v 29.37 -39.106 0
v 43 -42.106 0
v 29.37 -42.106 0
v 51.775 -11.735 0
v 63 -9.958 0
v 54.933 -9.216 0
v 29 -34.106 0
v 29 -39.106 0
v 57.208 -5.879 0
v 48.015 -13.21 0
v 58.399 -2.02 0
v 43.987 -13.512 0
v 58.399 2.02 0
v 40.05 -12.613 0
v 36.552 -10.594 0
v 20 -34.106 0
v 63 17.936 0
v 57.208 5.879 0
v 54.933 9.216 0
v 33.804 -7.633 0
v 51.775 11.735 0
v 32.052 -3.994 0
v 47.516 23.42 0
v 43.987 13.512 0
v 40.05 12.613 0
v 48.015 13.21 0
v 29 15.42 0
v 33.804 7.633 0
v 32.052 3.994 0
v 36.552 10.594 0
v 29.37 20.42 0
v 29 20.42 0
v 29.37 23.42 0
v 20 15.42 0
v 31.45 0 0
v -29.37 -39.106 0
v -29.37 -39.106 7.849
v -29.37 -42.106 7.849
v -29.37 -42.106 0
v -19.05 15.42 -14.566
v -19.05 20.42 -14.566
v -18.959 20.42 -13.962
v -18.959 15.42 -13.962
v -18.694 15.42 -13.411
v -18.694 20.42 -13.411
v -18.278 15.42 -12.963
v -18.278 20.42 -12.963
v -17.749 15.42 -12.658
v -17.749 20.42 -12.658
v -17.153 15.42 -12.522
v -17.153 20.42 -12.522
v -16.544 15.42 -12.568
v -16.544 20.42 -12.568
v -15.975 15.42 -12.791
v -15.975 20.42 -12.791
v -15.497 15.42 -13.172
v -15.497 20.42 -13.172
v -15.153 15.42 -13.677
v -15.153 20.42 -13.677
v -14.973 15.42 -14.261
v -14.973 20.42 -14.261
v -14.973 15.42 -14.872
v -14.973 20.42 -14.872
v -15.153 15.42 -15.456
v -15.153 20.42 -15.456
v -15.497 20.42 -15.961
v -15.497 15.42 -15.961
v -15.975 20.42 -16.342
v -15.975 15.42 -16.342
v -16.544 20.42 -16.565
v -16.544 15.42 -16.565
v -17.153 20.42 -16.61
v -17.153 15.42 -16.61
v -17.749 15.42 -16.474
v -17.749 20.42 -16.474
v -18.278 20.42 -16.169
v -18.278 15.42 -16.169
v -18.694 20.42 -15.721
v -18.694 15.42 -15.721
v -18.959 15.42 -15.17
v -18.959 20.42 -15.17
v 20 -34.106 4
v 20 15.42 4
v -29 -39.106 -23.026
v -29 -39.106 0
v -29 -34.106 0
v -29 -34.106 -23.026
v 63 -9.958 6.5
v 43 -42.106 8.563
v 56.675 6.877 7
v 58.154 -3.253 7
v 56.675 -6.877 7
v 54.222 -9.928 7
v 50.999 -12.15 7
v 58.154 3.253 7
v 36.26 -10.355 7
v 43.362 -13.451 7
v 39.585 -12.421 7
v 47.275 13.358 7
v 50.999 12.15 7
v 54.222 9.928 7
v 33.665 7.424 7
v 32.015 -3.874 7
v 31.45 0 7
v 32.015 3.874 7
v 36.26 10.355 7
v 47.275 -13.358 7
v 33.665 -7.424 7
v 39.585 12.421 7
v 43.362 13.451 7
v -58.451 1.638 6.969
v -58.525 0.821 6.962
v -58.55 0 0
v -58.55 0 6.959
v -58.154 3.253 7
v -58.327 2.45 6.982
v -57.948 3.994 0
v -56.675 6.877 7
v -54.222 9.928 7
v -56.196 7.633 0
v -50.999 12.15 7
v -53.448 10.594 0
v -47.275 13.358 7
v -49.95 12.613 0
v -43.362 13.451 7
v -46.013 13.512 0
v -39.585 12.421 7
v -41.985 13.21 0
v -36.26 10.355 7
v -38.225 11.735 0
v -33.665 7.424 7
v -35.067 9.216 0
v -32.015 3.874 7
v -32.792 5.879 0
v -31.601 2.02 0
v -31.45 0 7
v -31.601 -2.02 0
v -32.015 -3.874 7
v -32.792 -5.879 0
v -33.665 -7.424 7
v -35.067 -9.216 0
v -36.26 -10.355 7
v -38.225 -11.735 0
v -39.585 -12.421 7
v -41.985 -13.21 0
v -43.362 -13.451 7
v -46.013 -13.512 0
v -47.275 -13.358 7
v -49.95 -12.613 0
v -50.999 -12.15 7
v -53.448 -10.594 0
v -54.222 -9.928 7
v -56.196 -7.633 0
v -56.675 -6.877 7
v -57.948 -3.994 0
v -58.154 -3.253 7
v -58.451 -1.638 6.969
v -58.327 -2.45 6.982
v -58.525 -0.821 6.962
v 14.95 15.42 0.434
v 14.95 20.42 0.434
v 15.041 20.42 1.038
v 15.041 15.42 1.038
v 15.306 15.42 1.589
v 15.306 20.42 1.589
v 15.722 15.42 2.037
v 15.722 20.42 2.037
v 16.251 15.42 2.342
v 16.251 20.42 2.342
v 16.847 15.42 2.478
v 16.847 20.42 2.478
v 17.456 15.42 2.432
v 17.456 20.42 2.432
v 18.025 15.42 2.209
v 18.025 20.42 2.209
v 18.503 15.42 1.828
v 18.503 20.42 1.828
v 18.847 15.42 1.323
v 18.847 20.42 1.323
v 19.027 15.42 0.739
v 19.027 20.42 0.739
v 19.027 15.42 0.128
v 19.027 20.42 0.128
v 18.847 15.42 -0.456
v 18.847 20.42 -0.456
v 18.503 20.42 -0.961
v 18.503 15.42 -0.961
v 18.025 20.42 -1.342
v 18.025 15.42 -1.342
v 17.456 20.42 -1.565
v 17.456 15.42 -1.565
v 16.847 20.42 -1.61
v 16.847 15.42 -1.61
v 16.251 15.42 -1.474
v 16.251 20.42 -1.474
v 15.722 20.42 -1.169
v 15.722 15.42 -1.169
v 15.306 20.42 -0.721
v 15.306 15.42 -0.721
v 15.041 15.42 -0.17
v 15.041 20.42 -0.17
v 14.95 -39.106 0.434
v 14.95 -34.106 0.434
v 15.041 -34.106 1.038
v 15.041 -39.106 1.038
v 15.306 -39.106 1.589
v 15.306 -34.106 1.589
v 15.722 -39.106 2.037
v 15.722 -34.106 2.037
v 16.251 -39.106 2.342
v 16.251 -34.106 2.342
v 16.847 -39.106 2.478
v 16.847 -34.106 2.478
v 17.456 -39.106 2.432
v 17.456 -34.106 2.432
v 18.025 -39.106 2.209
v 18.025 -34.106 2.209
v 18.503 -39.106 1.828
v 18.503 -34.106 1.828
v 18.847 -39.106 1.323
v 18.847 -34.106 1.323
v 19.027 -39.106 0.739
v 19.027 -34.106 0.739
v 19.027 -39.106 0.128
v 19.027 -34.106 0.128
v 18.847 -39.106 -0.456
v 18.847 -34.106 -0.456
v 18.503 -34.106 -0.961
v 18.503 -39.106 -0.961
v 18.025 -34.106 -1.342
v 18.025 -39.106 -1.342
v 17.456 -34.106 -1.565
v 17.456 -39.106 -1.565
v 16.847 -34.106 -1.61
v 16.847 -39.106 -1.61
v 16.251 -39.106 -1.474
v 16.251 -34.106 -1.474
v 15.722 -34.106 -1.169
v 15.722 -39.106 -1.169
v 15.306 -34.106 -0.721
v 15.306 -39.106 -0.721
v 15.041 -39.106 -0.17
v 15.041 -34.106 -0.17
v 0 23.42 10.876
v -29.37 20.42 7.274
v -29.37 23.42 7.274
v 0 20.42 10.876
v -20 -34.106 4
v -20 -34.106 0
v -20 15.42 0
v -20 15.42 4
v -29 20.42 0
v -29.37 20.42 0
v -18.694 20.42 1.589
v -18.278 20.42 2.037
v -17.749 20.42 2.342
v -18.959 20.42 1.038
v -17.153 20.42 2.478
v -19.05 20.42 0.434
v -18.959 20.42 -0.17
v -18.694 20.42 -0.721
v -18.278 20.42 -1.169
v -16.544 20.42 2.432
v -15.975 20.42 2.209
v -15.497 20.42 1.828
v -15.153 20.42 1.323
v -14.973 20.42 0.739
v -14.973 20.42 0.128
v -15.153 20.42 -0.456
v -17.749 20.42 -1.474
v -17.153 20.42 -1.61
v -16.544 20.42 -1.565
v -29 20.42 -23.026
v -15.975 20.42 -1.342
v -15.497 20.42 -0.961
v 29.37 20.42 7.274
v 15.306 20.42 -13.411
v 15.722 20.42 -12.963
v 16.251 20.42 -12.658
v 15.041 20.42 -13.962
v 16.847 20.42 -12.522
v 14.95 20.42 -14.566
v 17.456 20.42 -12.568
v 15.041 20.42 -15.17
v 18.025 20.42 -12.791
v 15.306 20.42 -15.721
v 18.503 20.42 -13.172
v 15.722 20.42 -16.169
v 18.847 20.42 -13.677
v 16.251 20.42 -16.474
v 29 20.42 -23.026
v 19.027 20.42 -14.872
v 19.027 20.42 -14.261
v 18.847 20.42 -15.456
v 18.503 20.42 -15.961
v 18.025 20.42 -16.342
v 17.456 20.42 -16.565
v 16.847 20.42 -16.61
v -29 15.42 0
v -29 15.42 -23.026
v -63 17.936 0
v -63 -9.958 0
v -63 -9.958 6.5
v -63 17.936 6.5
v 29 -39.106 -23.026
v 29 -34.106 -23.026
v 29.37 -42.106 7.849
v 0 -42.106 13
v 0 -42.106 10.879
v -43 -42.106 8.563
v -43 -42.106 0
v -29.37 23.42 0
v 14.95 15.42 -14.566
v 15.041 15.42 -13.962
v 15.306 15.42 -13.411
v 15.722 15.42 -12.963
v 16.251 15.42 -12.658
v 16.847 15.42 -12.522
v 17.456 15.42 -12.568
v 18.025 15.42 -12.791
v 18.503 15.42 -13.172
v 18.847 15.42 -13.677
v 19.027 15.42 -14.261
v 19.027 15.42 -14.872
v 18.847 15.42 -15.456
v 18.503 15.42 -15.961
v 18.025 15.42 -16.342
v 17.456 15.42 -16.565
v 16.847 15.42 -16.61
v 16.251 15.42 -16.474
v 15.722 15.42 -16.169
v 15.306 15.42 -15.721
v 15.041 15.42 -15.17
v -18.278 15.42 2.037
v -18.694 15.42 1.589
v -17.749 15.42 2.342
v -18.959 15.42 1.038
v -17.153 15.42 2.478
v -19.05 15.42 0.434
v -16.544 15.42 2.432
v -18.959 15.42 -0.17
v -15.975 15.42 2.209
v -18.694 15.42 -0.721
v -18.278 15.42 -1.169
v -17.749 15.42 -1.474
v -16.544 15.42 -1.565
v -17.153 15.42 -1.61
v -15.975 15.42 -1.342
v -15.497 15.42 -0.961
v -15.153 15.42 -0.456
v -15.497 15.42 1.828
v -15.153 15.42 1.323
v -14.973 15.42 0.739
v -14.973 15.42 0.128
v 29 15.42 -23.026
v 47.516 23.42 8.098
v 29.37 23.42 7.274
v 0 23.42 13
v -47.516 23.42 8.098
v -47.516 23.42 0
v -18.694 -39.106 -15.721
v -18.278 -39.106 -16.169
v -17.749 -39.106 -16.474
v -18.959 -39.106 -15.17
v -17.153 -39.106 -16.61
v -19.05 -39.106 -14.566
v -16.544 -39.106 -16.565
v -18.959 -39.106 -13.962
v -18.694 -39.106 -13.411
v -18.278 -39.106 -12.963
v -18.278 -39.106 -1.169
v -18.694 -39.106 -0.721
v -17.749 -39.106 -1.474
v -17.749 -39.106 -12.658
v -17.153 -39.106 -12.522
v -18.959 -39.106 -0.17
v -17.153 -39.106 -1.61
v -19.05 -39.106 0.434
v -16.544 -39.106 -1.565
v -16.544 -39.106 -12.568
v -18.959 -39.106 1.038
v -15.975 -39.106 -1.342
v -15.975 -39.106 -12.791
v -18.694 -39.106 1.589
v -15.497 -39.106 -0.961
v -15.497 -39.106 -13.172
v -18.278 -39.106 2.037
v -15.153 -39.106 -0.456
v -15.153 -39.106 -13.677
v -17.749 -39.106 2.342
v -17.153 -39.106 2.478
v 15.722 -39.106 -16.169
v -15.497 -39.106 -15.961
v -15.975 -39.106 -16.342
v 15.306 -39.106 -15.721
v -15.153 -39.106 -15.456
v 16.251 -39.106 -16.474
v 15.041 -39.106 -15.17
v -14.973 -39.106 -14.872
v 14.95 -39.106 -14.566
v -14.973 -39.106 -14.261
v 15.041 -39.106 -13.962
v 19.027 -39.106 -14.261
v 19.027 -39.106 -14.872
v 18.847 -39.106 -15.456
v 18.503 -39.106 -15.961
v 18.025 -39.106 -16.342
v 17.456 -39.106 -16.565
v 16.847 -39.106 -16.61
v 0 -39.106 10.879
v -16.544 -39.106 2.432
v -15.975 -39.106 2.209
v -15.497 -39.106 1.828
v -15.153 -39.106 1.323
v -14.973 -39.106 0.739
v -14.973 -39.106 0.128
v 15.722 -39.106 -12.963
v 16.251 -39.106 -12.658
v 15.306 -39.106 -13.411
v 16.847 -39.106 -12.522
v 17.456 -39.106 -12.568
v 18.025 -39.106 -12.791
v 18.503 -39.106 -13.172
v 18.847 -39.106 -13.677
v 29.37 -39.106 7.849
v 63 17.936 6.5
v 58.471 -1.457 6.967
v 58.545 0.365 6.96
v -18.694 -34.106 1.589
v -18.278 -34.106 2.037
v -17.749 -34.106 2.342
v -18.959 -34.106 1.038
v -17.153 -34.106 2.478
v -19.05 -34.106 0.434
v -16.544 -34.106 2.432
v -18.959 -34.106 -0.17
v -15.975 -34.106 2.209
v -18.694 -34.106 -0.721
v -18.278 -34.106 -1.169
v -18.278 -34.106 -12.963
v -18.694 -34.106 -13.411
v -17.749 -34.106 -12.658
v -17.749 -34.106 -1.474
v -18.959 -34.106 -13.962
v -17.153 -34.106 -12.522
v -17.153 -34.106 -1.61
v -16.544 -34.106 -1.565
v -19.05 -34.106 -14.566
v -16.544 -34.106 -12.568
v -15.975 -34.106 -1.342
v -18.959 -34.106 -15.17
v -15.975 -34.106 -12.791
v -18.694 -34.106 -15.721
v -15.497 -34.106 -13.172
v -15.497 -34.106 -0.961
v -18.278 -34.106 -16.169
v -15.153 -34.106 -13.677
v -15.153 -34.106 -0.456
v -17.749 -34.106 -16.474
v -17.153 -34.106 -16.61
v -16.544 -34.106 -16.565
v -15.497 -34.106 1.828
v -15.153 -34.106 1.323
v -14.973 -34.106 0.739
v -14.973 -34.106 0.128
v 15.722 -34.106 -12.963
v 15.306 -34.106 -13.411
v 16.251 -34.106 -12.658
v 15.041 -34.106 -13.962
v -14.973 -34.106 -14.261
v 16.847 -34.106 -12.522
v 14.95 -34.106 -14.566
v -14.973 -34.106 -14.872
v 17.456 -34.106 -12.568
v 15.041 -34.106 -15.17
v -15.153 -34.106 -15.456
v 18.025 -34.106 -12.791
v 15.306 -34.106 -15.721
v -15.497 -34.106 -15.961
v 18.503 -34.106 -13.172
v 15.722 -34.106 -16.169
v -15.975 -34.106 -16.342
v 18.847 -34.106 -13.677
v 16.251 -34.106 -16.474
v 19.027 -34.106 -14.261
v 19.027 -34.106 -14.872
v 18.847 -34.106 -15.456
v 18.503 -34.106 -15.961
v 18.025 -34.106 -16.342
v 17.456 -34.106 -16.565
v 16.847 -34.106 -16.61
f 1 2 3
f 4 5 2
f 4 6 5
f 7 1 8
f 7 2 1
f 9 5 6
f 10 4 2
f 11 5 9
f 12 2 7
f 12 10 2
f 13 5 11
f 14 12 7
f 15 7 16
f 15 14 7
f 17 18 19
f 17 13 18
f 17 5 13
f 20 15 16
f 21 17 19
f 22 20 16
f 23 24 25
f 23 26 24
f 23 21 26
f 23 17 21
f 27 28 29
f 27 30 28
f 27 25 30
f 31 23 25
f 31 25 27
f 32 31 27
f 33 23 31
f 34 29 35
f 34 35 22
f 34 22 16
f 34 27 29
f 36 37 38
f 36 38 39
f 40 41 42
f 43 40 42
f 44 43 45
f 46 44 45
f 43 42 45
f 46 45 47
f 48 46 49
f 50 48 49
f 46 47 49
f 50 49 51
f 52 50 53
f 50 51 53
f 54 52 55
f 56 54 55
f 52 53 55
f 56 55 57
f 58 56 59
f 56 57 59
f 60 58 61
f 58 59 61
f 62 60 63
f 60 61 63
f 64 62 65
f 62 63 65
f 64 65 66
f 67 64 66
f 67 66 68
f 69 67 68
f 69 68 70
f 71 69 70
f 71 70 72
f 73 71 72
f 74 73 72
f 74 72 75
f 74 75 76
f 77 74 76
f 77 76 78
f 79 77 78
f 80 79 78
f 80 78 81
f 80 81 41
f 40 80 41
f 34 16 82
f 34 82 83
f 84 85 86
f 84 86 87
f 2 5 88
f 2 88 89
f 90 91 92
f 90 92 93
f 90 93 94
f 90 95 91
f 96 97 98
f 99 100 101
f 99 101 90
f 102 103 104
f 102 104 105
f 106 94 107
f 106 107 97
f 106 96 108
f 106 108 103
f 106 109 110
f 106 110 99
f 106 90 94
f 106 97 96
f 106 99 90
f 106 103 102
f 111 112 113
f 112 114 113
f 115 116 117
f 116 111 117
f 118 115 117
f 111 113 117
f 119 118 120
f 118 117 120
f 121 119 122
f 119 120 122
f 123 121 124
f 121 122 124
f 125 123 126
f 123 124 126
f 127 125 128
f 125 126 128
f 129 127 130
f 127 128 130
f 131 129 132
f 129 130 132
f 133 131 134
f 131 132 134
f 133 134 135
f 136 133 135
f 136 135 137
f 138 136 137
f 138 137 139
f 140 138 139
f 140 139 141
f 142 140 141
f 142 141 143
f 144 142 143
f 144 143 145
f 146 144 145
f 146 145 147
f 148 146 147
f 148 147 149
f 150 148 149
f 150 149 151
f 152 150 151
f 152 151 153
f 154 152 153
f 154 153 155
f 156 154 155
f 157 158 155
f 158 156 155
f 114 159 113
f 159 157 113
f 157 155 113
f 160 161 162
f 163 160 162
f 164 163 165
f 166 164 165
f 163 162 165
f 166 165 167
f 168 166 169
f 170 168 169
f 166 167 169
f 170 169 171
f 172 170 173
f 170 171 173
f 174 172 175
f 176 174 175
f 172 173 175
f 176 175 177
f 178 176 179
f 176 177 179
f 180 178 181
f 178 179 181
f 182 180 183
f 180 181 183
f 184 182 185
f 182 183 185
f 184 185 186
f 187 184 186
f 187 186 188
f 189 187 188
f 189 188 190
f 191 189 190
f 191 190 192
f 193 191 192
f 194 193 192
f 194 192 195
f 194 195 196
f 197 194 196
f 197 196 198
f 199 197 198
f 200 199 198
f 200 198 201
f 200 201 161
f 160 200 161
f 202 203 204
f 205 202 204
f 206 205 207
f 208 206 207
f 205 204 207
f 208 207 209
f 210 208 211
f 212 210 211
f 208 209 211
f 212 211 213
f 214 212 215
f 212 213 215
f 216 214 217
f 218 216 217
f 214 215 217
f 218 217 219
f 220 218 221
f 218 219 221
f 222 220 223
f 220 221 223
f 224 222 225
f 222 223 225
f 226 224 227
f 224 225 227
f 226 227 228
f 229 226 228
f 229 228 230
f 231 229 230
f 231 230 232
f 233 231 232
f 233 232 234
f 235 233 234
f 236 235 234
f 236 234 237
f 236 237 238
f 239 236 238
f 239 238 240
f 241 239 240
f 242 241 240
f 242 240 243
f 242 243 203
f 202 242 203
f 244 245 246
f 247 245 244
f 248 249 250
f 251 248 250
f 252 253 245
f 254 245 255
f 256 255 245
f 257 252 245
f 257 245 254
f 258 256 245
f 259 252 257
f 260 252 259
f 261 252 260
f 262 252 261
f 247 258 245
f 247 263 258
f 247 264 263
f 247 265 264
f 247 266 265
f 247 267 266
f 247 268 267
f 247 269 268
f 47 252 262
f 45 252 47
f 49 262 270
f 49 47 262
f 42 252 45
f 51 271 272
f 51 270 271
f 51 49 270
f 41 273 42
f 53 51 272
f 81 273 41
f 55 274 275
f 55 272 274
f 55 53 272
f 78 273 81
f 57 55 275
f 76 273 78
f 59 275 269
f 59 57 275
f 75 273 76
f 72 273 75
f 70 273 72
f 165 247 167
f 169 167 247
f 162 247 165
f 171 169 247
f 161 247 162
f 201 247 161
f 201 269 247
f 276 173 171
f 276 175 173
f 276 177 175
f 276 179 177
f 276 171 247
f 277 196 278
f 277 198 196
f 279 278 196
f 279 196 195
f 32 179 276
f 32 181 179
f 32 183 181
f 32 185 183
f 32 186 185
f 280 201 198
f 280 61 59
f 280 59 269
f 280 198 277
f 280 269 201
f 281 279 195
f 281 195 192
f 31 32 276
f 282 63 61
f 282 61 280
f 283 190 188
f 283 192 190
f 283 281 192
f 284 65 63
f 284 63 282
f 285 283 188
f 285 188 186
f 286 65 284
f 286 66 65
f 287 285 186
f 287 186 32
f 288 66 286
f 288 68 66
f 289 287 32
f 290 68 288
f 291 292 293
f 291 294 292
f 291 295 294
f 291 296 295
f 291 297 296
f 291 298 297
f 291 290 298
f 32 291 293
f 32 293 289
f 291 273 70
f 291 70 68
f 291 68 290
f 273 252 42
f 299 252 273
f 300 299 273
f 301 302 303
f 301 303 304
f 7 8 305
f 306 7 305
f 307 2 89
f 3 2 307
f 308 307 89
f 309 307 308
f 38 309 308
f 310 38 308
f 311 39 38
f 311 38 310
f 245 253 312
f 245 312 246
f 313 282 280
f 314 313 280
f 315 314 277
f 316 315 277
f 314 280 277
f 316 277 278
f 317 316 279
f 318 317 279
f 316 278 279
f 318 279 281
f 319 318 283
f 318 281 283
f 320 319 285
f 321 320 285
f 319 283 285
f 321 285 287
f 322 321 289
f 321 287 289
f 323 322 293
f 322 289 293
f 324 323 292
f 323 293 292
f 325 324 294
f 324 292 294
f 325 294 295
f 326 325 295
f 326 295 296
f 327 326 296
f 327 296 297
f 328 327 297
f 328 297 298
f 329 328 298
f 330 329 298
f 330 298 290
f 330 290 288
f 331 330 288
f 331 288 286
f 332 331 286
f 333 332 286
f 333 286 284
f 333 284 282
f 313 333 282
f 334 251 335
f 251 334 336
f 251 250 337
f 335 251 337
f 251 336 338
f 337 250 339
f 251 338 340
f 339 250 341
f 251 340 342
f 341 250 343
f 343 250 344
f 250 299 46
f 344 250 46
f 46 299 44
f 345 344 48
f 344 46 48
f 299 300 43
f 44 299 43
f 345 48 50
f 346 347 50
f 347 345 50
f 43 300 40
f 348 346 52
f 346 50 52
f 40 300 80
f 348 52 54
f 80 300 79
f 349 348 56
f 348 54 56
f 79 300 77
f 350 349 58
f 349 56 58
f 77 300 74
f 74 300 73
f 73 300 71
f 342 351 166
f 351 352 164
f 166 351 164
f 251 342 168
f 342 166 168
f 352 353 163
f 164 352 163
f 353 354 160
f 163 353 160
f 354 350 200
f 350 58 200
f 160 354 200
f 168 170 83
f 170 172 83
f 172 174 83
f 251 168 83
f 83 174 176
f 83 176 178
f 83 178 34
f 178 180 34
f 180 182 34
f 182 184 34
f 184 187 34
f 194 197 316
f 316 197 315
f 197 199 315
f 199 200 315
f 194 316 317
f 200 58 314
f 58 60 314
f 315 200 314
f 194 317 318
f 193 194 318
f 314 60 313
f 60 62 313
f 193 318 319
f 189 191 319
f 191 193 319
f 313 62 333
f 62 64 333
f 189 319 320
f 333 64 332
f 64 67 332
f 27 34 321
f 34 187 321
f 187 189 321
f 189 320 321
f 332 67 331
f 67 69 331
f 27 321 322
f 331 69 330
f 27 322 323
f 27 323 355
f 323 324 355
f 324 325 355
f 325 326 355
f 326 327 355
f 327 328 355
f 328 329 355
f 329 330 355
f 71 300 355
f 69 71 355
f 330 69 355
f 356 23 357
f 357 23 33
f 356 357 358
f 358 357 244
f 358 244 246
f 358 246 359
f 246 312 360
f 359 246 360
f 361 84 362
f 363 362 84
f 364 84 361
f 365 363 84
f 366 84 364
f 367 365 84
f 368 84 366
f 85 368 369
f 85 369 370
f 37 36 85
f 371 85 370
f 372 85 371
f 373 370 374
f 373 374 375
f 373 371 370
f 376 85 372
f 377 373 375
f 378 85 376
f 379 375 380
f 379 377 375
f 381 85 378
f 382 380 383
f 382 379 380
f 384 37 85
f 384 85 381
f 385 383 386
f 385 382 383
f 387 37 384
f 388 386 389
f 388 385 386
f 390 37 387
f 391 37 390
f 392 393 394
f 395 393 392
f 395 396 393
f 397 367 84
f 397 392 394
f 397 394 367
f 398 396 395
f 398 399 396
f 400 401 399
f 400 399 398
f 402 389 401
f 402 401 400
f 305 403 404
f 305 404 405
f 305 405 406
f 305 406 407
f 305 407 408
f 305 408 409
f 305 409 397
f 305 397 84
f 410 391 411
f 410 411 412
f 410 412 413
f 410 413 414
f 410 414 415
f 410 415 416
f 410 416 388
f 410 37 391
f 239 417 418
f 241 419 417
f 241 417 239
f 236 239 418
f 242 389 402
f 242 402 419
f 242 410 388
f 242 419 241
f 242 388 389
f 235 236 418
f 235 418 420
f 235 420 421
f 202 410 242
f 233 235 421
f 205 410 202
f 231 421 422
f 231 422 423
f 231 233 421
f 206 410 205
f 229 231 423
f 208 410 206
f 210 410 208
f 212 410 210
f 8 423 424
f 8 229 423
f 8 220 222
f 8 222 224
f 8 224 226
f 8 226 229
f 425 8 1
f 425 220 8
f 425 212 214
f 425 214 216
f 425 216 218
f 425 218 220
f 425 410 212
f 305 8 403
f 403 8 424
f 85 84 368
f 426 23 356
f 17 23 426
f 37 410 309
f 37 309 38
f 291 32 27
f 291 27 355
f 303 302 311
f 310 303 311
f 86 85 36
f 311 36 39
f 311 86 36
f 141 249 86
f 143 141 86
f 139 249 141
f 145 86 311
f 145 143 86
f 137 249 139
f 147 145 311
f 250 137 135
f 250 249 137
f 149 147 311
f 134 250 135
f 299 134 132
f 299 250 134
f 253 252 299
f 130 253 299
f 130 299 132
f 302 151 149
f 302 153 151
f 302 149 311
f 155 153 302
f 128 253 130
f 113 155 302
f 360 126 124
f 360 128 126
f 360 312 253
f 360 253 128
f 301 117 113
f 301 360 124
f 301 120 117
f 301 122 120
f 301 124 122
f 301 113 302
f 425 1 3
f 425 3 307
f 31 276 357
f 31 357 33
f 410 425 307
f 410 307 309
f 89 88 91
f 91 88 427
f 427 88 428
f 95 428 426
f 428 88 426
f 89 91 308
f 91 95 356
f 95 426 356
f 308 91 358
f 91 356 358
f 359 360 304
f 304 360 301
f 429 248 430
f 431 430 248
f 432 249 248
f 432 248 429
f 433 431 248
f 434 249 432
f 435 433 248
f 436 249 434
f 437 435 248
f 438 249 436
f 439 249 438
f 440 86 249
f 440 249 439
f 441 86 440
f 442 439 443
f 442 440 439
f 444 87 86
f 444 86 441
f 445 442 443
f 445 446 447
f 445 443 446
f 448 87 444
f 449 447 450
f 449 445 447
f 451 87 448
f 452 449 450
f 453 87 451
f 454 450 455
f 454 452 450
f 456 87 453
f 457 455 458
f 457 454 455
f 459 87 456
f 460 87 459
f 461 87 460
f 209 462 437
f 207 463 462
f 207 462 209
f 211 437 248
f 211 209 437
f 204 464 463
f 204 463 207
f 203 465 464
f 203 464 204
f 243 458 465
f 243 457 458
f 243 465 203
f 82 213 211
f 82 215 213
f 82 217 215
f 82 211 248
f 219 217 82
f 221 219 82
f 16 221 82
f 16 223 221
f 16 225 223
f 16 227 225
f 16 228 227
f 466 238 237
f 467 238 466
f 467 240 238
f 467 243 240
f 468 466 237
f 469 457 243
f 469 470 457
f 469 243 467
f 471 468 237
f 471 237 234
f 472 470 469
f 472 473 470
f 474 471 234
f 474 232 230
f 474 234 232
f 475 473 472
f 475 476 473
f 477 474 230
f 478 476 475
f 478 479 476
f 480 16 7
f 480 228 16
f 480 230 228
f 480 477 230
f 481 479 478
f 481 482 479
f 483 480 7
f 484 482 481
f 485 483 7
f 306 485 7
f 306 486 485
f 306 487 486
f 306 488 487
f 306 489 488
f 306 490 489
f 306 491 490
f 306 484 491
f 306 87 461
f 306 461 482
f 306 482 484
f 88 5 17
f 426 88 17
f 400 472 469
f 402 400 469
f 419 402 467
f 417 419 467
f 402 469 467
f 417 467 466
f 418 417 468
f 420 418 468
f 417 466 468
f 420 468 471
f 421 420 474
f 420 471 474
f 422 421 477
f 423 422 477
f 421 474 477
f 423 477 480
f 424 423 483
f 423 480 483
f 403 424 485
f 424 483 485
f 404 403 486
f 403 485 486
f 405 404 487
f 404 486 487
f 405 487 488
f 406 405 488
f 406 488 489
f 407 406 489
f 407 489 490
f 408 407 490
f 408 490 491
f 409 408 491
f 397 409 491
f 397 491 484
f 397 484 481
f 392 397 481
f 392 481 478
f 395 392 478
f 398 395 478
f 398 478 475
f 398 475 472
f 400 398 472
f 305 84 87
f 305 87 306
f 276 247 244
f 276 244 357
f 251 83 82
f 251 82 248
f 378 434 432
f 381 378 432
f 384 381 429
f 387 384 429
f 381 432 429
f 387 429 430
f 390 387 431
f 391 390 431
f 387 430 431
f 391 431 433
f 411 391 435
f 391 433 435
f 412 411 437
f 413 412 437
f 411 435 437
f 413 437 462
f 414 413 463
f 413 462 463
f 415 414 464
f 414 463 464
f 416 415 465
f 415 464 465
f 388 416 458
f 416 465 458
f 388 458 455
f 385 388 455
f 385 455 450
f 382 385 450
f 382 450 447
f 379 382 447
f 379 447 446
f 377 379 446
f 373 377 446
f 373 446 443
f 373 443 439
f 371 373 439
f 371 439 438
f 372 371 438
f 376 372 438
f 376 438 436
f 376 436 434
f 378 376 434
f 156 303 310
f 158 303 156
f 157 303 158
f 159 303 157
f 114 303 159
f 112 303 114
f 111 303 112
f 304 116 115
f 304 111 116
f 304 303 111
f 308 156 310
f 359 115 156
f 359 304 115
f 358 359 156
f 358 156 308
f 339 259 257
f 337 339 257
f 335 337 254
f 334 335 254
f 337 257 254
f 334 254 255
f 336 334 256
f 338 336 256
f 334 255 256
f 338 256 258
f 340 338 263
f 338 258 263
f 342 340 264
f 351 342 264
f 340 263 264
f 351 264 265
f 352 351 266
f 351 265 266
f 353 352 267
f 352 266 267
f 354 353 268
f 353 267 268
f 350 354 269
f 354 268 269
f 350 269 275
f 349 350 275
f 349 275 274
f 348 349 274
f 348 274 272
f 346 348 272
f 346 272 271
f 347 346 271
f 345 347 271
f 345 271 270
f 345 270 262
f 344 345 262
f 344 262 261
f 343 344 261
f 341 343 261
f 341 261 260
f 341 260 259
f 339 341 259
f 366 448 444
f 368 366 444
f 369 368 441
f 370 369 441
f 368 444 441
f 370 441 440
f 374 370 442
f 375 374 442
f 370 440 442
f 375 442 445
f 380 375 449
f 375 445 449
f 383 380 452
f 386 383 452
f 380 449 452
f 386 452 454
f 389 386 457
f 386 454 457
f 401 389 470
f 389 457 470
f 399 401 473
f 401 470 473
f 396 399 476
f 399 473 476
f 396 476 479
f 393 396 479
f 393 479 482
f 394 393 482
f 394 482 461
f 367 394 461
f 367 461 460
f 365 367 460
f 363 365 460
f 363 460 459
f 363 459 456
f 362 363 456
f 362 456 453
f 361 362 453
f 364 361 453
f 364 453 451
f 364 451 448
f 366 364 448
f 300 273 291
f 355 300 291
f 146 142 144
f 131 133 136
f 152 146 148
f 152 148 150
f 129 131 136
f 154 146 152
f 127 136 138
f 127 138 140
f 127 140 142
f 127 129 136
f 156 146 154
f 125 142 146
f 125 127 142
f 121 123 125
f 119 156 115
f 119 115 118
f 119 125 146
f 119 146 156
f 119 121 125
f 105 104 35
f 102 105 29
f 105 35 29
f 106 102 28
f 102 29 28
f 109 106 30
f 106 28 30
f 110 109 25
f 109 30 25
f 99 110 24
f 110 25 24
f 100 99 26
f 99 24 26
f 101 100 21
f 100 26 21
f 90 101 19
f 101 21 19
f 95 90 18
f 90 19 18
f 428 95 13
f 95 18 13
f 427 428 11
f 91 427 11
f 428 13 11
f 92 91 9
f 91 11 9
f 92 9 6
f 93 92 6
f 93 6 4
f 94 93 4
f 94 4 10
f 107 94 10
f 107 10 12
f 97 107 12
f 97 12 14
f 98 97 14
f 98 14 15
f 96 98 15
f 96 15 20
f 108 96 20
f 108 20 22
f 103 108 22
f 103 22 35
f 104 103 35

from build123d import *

# Parameters (mm, degrees)
SKETCH1_W                = 200
SKETCH1_H                = 60
BOSS_EXTRUDE1_DEPTH      = 25
SKETCH3_R                = 13.55
CUT_EXTRUDE1_DEPTH       = 7
CUT_EXTRUDE3_DEPTH       = 108.354552768
CUT_EXTRUDE7_DEPTH       = 45
FILLET8_R                = 5
SKETCH13_W               = 227.671202294
SKETCH13_H               = 68.392794906
SKETCH13_W_2             = 126
SKETCH13_H_2             = 41.42
CUT_EXTRUDE8_DEPTH       = 108.354552768
SKETCH14_W               = 12
SKETCH14_H               = 41.42
CUT_EXTRUDE9_DEPTH       = 131.573720174
CUT_EXTRUDE10_DEPTH      = 77.508930198
SKETCH19_W               = 126
SKETCH19_H               = 24.105748896
BOSS_EXTRUDE2_DEPTH      = 13
CUT_EXTRUDE11_DEPTH      = 77.508930198
CUT_EXTRUDE12_DEPTH      = 13
SKETCH22_W               = 58
SKETCH22_H               = 23.025801555
BOSS_EXTRUDE3_DEPTH      = 8
SKETCH24_W               = 40
SKETCH24_H               = 49.525748896
CUT_EXTRUDE13_DEPTH      = 4
CUT_EXTRUDE14_START      = -3
CUT_EXTRUDE14_DEPTH      = 3
CUT_EXTRUDE15_DEPTH      = 94.769991499
CUT_EXTRUDE15_DEPTH_BACK = 3
SKETCH27_R               = 2.05
CUT_EXTRUDE16_DEPTH      = 92.698728521


# Read off the part's stored shape, not the designer's step: Cut-Extrude14
with BuildPart() as part:
    # Sketch1 → Boss-Extrude1 (new body)
    with BuildSketch(Plane.XY):
        Rectangle(SKETCH1_W, SKETCH1_H)
    extrude(amount=BOSS_EXTRUDE1_DEPTH)

    # Sketch3 → Cut-Extrude1 (cut)
    with BuildSketch(Plane(origin=(0, 0, 0), x_dir=(-1, 0, 0), z_dir=(0, 0, -1))):
        with Locations((-45, 0)):
            Circle(SKETCH3_R)
        with Locations((45, 0)):
            Circle(SKETCH3_R)
    extrude(amount=-CUT_EXTRUDE1_DEPTH, mode=Mode.SUBTRACT)

    # Sketch6 → Cut-Extrude3 (cut, through all)
    with BuildSketch(Plane(origin=(0, 0, 0), x_dir=(-1, 0, 0), z_dir=(0, 0, -1))):
        Polygon((-100, 15.531551678), (-87.020750536, 30), (-100, 30), align=None)
        Polygon((-89.003501814, -30), (-100, -15.090940283), (-100, -30), align=None)
        Polygon((100, -30), (100, -15.090940283), (89.003501814, -30), align=None)
        Polygon((100, 30), (87.020750536, 30), (100, 15.531551678), align=None)
    extrude(amount=-CUT_EXTRUDE3_DEPTH, mode=Mode.SUBTRACT)

    # Sketch11 → Cut-Extrude7 (cut)
    with BuildSketch(Plane(origin=(0, 0, 0), x_dir=(-1, 0, 0), z_dir=(0, 0, -1))):
        Polygon((8.001444911, 30), (-99.028209758, 30), (-99.028209758, 24.58), (8.001444911, 24.58), (98.384596387, 24.58), (98.384596387, 30), align=None)
    extrude(amount=-CUT_EXTRUDE7_DEPTH, mode=Mode.SUBTRACT)

    # Fillet8
    fillet8_edges = [part.edges().sort_by_distance(p)[0] for p in [
        (100, 0.220305698, 25),
        (-100, 0.220305698, 25),
        (0, -30, 25),
        (-94.501750907, -22.545470141, 25),
        (94.501750907, -22.545470141, 25),
        (-95.941442184, 20.055775839, 25),
        (95.941442184, 20.055775839, 25),
        (0, 24.58, 25),
    ]]
    fillet(fillet8_edges, radius=FILLET8_R)

    # Sketch13 → Cut-Extrude8 (cut, through all)
    with BuildSketch(Plane(origin=(0, 0, 0), x_dir=(-1, 0, 0), z_dir=(0, 0, -1))):
        with Locations((1.665204381, -2.689234518)):
            Rectangle(SKETCH13_W, SKETCH13_H)
        with Locations((0, 2.71)):
            Rectangle(SKETCH13_W_2, SKETCH13_H_2, mode=Mode.SUBTRACT)
    extrude(amount=-CUT_EXTRUDE8_DEPTH, mode=Mode.SUBTRACT)

    # Sketch14 → Cut-Extrude9 (cut, through all)
    with BuildSketch(Plane(origin=(63, 0, 0), x_dir=(0, 0, -1), z_dir=(1, 0, 0))):
        with Locations((-19, 2.71)):
            Rectangle(SKETCH14_W, SKETCH14_H)
    extrude(amount=-CUT_EXTRUDE9_DEPTH, mode=Mode.SUBTRACT)

    # Sketch15 → Cut-Extrude10 (cut, through all)
    with BuildSketch(Plane(origin=(0, 23.42, 0), x_dir=(1, 0, 0), z_dir=(0, 1, 0))):
        Polygon((63, -6.5), (0, -13), (63, -13), align=None)
        Polygon((-63, -6.5), (0, -13), (-63, -13), align=None)
    extrude(amount=-CUT_EXTRUDE10_DEPTH, mode=Mode.SUBTRACT)

    # Sketch19 → Boss-Extrude2 (add)
    with BuildSketch(Plane(origin=(0, 0, 0), x_dir=(-1, 0, 0), z_dir=(0, 0, -1))):
        with Locations((0, -30.052874448)):
            Rectangle(SKETCH19_W, SKETCH19_H)
    extrude(amount=-BOSS_EXTRUDE2_DEPTH)

    # Sketch20 → Cut-Extrude11 (cut, through all)
    with BuildSketch(Plane(origin=(0, -18, 0), x_dir=(1, 0, 0), z_dir=(0, 1, 0))):
        Polygon((-63, -6.5), (-63, -13), (63, -13), (63, -6.5), (0, -13), align=None)
    extrude(amount=-CUT_EXTRUDE11_DEPTH, mode=Mode.SUBTRACT)

    # Sketch21 → Cut-Extrude12 (cut)
    with BuildSketch(Plane(origin=(0, 0, 0), x_dir=(-1, 0, 0), z_dir=(0, 0, -1))):
        Polygon((-63, -9.957970409), (-43, -42.105748896), (-63, -42.105748896), align=None)
        Polygon((-47.515984788, 23.42), (-63, 17.935984788), (-63, 23.42), align=None)
    cut_extrude12 = extrude(amount=-CUT_EXTRUDE12_DEPTH, mode=Mode.SUBTRACT)

    # Mirror1: Cut-Extrude12 across plane
    add(cut_extrude12.mirror(Plane(origin=(0, 0, 0), x_dir=(0, 0, 1), z_dir=(1, 0, 0))), mode=Mode.SUBTRACT)

    # Sketch22 → Boss-Extrude3 (add)
    with BuildSketch(Plane(origin=(0, 23.42, 0), x_dir=(1, 0, 0), z_dir=(0, 1, 0))):
        with Locations((0, 11.512900778)):
            Rectangle(SKETCH22_W, SKETCH22_H)
    boss_extrude3 = extrude(amount=-BOSS_EXTRUDE3_DEPTH)

    # Mirror2: Boss-Extrude3 across plane
    add(boss_extrude3.mirror(Plane(origin=(0, -9.342874448, 0), x_dir=(0, 0, 1), z_dir=(0, -1, 0))))

    # Sketch24 → Cut-Extrude13 (cut)
    with BuildSketch(Plane(origin=(0, 0, 0), x_dir=(-1, 0, 0), z_dir=(0, 0, -1))):
        with Locations((0, -9.342874448)):
            Rectangle(SKETCH24_W, SKETCH24_H)
    extrude(amount=-CUT_EXTRUDE13_DEPTH, mode=Mode.SUBTRACT)

    # Cut-Extrude14 outline → Cut-Extrude14 (cut)
    with BuildSketch(Plane(origin=(0, 23.42, 0), x_dir=(1, 0, 0), z_dir=(0, 1, 0)).offset(CUT_EXTRUDE14_START)):
        Polygon((29.370193256, -7.27376555), (29.370193256, 0), (29, 0), (29, 23.025801555), (-29, 23.025801555), (-29, 0), (-29.370193256, 0), (-29.370193256, -7.27376555), (0, -10.875770383), align=None)
    extrude(amount=CUT_EXTRUDE14_DEPTH, mode=Mode.SUBTRACT)

    # Sketch26 → Cut-Extrude15 (cut, two sides: drawn at the far end of the back side and taken through both)
    with BuildSketch(Plane.XZ.offset(42.105748896).offset(-CUT_EXTRUDE15_DEPTH_BACK)):
        Polygon((29, -230.630036101), (29, -23.025801555), (29, 0), (29.37, 0), (29.37, 7.84856116), (0, 10.878799255), (-29.37, 7.84856116), (-29.37, 0), (-29, 0), (-29, -23.025801555), (-29, -230.630036101), (-29, -645.838505193), (29, -645.838505193), align=None)
    extrude(amount=CUT_EXTRUDE15_DEPTH + CUT_EXTRUDE15_DEPTH_BACK, mode=Mode.SUBTRACT)

    # Sketch27 → Cut-Extrude16 (cut, through all)
    with BuildSketch(Plane(origin=(0, 20.42, 0), x_dir=(1, 0, 0), z_dir=(0, 1, 0))):
        with Locations(Location((17, -0.433798275, 0), (0, 0, 180))):
            Circle(SKETCH27_R)
        with Locations(Location((-17, -0.433798275, 0), (0, 0, 180))):
            Circle(SKETCH27_R)
        with Locations(Location((-17, 14.566201725, 0), (0, 0, 180))):
            Circle(SKETCH27_R)
        with Locations(Location((17, 14.566201725, 0), (0, 0, 180))):
            Circle(SKETCH27_R)
    extrude(amount=-CUT_EXTRUDE16_DEPTH, mode=Mode.SUBTRACT)


solid = part.part
